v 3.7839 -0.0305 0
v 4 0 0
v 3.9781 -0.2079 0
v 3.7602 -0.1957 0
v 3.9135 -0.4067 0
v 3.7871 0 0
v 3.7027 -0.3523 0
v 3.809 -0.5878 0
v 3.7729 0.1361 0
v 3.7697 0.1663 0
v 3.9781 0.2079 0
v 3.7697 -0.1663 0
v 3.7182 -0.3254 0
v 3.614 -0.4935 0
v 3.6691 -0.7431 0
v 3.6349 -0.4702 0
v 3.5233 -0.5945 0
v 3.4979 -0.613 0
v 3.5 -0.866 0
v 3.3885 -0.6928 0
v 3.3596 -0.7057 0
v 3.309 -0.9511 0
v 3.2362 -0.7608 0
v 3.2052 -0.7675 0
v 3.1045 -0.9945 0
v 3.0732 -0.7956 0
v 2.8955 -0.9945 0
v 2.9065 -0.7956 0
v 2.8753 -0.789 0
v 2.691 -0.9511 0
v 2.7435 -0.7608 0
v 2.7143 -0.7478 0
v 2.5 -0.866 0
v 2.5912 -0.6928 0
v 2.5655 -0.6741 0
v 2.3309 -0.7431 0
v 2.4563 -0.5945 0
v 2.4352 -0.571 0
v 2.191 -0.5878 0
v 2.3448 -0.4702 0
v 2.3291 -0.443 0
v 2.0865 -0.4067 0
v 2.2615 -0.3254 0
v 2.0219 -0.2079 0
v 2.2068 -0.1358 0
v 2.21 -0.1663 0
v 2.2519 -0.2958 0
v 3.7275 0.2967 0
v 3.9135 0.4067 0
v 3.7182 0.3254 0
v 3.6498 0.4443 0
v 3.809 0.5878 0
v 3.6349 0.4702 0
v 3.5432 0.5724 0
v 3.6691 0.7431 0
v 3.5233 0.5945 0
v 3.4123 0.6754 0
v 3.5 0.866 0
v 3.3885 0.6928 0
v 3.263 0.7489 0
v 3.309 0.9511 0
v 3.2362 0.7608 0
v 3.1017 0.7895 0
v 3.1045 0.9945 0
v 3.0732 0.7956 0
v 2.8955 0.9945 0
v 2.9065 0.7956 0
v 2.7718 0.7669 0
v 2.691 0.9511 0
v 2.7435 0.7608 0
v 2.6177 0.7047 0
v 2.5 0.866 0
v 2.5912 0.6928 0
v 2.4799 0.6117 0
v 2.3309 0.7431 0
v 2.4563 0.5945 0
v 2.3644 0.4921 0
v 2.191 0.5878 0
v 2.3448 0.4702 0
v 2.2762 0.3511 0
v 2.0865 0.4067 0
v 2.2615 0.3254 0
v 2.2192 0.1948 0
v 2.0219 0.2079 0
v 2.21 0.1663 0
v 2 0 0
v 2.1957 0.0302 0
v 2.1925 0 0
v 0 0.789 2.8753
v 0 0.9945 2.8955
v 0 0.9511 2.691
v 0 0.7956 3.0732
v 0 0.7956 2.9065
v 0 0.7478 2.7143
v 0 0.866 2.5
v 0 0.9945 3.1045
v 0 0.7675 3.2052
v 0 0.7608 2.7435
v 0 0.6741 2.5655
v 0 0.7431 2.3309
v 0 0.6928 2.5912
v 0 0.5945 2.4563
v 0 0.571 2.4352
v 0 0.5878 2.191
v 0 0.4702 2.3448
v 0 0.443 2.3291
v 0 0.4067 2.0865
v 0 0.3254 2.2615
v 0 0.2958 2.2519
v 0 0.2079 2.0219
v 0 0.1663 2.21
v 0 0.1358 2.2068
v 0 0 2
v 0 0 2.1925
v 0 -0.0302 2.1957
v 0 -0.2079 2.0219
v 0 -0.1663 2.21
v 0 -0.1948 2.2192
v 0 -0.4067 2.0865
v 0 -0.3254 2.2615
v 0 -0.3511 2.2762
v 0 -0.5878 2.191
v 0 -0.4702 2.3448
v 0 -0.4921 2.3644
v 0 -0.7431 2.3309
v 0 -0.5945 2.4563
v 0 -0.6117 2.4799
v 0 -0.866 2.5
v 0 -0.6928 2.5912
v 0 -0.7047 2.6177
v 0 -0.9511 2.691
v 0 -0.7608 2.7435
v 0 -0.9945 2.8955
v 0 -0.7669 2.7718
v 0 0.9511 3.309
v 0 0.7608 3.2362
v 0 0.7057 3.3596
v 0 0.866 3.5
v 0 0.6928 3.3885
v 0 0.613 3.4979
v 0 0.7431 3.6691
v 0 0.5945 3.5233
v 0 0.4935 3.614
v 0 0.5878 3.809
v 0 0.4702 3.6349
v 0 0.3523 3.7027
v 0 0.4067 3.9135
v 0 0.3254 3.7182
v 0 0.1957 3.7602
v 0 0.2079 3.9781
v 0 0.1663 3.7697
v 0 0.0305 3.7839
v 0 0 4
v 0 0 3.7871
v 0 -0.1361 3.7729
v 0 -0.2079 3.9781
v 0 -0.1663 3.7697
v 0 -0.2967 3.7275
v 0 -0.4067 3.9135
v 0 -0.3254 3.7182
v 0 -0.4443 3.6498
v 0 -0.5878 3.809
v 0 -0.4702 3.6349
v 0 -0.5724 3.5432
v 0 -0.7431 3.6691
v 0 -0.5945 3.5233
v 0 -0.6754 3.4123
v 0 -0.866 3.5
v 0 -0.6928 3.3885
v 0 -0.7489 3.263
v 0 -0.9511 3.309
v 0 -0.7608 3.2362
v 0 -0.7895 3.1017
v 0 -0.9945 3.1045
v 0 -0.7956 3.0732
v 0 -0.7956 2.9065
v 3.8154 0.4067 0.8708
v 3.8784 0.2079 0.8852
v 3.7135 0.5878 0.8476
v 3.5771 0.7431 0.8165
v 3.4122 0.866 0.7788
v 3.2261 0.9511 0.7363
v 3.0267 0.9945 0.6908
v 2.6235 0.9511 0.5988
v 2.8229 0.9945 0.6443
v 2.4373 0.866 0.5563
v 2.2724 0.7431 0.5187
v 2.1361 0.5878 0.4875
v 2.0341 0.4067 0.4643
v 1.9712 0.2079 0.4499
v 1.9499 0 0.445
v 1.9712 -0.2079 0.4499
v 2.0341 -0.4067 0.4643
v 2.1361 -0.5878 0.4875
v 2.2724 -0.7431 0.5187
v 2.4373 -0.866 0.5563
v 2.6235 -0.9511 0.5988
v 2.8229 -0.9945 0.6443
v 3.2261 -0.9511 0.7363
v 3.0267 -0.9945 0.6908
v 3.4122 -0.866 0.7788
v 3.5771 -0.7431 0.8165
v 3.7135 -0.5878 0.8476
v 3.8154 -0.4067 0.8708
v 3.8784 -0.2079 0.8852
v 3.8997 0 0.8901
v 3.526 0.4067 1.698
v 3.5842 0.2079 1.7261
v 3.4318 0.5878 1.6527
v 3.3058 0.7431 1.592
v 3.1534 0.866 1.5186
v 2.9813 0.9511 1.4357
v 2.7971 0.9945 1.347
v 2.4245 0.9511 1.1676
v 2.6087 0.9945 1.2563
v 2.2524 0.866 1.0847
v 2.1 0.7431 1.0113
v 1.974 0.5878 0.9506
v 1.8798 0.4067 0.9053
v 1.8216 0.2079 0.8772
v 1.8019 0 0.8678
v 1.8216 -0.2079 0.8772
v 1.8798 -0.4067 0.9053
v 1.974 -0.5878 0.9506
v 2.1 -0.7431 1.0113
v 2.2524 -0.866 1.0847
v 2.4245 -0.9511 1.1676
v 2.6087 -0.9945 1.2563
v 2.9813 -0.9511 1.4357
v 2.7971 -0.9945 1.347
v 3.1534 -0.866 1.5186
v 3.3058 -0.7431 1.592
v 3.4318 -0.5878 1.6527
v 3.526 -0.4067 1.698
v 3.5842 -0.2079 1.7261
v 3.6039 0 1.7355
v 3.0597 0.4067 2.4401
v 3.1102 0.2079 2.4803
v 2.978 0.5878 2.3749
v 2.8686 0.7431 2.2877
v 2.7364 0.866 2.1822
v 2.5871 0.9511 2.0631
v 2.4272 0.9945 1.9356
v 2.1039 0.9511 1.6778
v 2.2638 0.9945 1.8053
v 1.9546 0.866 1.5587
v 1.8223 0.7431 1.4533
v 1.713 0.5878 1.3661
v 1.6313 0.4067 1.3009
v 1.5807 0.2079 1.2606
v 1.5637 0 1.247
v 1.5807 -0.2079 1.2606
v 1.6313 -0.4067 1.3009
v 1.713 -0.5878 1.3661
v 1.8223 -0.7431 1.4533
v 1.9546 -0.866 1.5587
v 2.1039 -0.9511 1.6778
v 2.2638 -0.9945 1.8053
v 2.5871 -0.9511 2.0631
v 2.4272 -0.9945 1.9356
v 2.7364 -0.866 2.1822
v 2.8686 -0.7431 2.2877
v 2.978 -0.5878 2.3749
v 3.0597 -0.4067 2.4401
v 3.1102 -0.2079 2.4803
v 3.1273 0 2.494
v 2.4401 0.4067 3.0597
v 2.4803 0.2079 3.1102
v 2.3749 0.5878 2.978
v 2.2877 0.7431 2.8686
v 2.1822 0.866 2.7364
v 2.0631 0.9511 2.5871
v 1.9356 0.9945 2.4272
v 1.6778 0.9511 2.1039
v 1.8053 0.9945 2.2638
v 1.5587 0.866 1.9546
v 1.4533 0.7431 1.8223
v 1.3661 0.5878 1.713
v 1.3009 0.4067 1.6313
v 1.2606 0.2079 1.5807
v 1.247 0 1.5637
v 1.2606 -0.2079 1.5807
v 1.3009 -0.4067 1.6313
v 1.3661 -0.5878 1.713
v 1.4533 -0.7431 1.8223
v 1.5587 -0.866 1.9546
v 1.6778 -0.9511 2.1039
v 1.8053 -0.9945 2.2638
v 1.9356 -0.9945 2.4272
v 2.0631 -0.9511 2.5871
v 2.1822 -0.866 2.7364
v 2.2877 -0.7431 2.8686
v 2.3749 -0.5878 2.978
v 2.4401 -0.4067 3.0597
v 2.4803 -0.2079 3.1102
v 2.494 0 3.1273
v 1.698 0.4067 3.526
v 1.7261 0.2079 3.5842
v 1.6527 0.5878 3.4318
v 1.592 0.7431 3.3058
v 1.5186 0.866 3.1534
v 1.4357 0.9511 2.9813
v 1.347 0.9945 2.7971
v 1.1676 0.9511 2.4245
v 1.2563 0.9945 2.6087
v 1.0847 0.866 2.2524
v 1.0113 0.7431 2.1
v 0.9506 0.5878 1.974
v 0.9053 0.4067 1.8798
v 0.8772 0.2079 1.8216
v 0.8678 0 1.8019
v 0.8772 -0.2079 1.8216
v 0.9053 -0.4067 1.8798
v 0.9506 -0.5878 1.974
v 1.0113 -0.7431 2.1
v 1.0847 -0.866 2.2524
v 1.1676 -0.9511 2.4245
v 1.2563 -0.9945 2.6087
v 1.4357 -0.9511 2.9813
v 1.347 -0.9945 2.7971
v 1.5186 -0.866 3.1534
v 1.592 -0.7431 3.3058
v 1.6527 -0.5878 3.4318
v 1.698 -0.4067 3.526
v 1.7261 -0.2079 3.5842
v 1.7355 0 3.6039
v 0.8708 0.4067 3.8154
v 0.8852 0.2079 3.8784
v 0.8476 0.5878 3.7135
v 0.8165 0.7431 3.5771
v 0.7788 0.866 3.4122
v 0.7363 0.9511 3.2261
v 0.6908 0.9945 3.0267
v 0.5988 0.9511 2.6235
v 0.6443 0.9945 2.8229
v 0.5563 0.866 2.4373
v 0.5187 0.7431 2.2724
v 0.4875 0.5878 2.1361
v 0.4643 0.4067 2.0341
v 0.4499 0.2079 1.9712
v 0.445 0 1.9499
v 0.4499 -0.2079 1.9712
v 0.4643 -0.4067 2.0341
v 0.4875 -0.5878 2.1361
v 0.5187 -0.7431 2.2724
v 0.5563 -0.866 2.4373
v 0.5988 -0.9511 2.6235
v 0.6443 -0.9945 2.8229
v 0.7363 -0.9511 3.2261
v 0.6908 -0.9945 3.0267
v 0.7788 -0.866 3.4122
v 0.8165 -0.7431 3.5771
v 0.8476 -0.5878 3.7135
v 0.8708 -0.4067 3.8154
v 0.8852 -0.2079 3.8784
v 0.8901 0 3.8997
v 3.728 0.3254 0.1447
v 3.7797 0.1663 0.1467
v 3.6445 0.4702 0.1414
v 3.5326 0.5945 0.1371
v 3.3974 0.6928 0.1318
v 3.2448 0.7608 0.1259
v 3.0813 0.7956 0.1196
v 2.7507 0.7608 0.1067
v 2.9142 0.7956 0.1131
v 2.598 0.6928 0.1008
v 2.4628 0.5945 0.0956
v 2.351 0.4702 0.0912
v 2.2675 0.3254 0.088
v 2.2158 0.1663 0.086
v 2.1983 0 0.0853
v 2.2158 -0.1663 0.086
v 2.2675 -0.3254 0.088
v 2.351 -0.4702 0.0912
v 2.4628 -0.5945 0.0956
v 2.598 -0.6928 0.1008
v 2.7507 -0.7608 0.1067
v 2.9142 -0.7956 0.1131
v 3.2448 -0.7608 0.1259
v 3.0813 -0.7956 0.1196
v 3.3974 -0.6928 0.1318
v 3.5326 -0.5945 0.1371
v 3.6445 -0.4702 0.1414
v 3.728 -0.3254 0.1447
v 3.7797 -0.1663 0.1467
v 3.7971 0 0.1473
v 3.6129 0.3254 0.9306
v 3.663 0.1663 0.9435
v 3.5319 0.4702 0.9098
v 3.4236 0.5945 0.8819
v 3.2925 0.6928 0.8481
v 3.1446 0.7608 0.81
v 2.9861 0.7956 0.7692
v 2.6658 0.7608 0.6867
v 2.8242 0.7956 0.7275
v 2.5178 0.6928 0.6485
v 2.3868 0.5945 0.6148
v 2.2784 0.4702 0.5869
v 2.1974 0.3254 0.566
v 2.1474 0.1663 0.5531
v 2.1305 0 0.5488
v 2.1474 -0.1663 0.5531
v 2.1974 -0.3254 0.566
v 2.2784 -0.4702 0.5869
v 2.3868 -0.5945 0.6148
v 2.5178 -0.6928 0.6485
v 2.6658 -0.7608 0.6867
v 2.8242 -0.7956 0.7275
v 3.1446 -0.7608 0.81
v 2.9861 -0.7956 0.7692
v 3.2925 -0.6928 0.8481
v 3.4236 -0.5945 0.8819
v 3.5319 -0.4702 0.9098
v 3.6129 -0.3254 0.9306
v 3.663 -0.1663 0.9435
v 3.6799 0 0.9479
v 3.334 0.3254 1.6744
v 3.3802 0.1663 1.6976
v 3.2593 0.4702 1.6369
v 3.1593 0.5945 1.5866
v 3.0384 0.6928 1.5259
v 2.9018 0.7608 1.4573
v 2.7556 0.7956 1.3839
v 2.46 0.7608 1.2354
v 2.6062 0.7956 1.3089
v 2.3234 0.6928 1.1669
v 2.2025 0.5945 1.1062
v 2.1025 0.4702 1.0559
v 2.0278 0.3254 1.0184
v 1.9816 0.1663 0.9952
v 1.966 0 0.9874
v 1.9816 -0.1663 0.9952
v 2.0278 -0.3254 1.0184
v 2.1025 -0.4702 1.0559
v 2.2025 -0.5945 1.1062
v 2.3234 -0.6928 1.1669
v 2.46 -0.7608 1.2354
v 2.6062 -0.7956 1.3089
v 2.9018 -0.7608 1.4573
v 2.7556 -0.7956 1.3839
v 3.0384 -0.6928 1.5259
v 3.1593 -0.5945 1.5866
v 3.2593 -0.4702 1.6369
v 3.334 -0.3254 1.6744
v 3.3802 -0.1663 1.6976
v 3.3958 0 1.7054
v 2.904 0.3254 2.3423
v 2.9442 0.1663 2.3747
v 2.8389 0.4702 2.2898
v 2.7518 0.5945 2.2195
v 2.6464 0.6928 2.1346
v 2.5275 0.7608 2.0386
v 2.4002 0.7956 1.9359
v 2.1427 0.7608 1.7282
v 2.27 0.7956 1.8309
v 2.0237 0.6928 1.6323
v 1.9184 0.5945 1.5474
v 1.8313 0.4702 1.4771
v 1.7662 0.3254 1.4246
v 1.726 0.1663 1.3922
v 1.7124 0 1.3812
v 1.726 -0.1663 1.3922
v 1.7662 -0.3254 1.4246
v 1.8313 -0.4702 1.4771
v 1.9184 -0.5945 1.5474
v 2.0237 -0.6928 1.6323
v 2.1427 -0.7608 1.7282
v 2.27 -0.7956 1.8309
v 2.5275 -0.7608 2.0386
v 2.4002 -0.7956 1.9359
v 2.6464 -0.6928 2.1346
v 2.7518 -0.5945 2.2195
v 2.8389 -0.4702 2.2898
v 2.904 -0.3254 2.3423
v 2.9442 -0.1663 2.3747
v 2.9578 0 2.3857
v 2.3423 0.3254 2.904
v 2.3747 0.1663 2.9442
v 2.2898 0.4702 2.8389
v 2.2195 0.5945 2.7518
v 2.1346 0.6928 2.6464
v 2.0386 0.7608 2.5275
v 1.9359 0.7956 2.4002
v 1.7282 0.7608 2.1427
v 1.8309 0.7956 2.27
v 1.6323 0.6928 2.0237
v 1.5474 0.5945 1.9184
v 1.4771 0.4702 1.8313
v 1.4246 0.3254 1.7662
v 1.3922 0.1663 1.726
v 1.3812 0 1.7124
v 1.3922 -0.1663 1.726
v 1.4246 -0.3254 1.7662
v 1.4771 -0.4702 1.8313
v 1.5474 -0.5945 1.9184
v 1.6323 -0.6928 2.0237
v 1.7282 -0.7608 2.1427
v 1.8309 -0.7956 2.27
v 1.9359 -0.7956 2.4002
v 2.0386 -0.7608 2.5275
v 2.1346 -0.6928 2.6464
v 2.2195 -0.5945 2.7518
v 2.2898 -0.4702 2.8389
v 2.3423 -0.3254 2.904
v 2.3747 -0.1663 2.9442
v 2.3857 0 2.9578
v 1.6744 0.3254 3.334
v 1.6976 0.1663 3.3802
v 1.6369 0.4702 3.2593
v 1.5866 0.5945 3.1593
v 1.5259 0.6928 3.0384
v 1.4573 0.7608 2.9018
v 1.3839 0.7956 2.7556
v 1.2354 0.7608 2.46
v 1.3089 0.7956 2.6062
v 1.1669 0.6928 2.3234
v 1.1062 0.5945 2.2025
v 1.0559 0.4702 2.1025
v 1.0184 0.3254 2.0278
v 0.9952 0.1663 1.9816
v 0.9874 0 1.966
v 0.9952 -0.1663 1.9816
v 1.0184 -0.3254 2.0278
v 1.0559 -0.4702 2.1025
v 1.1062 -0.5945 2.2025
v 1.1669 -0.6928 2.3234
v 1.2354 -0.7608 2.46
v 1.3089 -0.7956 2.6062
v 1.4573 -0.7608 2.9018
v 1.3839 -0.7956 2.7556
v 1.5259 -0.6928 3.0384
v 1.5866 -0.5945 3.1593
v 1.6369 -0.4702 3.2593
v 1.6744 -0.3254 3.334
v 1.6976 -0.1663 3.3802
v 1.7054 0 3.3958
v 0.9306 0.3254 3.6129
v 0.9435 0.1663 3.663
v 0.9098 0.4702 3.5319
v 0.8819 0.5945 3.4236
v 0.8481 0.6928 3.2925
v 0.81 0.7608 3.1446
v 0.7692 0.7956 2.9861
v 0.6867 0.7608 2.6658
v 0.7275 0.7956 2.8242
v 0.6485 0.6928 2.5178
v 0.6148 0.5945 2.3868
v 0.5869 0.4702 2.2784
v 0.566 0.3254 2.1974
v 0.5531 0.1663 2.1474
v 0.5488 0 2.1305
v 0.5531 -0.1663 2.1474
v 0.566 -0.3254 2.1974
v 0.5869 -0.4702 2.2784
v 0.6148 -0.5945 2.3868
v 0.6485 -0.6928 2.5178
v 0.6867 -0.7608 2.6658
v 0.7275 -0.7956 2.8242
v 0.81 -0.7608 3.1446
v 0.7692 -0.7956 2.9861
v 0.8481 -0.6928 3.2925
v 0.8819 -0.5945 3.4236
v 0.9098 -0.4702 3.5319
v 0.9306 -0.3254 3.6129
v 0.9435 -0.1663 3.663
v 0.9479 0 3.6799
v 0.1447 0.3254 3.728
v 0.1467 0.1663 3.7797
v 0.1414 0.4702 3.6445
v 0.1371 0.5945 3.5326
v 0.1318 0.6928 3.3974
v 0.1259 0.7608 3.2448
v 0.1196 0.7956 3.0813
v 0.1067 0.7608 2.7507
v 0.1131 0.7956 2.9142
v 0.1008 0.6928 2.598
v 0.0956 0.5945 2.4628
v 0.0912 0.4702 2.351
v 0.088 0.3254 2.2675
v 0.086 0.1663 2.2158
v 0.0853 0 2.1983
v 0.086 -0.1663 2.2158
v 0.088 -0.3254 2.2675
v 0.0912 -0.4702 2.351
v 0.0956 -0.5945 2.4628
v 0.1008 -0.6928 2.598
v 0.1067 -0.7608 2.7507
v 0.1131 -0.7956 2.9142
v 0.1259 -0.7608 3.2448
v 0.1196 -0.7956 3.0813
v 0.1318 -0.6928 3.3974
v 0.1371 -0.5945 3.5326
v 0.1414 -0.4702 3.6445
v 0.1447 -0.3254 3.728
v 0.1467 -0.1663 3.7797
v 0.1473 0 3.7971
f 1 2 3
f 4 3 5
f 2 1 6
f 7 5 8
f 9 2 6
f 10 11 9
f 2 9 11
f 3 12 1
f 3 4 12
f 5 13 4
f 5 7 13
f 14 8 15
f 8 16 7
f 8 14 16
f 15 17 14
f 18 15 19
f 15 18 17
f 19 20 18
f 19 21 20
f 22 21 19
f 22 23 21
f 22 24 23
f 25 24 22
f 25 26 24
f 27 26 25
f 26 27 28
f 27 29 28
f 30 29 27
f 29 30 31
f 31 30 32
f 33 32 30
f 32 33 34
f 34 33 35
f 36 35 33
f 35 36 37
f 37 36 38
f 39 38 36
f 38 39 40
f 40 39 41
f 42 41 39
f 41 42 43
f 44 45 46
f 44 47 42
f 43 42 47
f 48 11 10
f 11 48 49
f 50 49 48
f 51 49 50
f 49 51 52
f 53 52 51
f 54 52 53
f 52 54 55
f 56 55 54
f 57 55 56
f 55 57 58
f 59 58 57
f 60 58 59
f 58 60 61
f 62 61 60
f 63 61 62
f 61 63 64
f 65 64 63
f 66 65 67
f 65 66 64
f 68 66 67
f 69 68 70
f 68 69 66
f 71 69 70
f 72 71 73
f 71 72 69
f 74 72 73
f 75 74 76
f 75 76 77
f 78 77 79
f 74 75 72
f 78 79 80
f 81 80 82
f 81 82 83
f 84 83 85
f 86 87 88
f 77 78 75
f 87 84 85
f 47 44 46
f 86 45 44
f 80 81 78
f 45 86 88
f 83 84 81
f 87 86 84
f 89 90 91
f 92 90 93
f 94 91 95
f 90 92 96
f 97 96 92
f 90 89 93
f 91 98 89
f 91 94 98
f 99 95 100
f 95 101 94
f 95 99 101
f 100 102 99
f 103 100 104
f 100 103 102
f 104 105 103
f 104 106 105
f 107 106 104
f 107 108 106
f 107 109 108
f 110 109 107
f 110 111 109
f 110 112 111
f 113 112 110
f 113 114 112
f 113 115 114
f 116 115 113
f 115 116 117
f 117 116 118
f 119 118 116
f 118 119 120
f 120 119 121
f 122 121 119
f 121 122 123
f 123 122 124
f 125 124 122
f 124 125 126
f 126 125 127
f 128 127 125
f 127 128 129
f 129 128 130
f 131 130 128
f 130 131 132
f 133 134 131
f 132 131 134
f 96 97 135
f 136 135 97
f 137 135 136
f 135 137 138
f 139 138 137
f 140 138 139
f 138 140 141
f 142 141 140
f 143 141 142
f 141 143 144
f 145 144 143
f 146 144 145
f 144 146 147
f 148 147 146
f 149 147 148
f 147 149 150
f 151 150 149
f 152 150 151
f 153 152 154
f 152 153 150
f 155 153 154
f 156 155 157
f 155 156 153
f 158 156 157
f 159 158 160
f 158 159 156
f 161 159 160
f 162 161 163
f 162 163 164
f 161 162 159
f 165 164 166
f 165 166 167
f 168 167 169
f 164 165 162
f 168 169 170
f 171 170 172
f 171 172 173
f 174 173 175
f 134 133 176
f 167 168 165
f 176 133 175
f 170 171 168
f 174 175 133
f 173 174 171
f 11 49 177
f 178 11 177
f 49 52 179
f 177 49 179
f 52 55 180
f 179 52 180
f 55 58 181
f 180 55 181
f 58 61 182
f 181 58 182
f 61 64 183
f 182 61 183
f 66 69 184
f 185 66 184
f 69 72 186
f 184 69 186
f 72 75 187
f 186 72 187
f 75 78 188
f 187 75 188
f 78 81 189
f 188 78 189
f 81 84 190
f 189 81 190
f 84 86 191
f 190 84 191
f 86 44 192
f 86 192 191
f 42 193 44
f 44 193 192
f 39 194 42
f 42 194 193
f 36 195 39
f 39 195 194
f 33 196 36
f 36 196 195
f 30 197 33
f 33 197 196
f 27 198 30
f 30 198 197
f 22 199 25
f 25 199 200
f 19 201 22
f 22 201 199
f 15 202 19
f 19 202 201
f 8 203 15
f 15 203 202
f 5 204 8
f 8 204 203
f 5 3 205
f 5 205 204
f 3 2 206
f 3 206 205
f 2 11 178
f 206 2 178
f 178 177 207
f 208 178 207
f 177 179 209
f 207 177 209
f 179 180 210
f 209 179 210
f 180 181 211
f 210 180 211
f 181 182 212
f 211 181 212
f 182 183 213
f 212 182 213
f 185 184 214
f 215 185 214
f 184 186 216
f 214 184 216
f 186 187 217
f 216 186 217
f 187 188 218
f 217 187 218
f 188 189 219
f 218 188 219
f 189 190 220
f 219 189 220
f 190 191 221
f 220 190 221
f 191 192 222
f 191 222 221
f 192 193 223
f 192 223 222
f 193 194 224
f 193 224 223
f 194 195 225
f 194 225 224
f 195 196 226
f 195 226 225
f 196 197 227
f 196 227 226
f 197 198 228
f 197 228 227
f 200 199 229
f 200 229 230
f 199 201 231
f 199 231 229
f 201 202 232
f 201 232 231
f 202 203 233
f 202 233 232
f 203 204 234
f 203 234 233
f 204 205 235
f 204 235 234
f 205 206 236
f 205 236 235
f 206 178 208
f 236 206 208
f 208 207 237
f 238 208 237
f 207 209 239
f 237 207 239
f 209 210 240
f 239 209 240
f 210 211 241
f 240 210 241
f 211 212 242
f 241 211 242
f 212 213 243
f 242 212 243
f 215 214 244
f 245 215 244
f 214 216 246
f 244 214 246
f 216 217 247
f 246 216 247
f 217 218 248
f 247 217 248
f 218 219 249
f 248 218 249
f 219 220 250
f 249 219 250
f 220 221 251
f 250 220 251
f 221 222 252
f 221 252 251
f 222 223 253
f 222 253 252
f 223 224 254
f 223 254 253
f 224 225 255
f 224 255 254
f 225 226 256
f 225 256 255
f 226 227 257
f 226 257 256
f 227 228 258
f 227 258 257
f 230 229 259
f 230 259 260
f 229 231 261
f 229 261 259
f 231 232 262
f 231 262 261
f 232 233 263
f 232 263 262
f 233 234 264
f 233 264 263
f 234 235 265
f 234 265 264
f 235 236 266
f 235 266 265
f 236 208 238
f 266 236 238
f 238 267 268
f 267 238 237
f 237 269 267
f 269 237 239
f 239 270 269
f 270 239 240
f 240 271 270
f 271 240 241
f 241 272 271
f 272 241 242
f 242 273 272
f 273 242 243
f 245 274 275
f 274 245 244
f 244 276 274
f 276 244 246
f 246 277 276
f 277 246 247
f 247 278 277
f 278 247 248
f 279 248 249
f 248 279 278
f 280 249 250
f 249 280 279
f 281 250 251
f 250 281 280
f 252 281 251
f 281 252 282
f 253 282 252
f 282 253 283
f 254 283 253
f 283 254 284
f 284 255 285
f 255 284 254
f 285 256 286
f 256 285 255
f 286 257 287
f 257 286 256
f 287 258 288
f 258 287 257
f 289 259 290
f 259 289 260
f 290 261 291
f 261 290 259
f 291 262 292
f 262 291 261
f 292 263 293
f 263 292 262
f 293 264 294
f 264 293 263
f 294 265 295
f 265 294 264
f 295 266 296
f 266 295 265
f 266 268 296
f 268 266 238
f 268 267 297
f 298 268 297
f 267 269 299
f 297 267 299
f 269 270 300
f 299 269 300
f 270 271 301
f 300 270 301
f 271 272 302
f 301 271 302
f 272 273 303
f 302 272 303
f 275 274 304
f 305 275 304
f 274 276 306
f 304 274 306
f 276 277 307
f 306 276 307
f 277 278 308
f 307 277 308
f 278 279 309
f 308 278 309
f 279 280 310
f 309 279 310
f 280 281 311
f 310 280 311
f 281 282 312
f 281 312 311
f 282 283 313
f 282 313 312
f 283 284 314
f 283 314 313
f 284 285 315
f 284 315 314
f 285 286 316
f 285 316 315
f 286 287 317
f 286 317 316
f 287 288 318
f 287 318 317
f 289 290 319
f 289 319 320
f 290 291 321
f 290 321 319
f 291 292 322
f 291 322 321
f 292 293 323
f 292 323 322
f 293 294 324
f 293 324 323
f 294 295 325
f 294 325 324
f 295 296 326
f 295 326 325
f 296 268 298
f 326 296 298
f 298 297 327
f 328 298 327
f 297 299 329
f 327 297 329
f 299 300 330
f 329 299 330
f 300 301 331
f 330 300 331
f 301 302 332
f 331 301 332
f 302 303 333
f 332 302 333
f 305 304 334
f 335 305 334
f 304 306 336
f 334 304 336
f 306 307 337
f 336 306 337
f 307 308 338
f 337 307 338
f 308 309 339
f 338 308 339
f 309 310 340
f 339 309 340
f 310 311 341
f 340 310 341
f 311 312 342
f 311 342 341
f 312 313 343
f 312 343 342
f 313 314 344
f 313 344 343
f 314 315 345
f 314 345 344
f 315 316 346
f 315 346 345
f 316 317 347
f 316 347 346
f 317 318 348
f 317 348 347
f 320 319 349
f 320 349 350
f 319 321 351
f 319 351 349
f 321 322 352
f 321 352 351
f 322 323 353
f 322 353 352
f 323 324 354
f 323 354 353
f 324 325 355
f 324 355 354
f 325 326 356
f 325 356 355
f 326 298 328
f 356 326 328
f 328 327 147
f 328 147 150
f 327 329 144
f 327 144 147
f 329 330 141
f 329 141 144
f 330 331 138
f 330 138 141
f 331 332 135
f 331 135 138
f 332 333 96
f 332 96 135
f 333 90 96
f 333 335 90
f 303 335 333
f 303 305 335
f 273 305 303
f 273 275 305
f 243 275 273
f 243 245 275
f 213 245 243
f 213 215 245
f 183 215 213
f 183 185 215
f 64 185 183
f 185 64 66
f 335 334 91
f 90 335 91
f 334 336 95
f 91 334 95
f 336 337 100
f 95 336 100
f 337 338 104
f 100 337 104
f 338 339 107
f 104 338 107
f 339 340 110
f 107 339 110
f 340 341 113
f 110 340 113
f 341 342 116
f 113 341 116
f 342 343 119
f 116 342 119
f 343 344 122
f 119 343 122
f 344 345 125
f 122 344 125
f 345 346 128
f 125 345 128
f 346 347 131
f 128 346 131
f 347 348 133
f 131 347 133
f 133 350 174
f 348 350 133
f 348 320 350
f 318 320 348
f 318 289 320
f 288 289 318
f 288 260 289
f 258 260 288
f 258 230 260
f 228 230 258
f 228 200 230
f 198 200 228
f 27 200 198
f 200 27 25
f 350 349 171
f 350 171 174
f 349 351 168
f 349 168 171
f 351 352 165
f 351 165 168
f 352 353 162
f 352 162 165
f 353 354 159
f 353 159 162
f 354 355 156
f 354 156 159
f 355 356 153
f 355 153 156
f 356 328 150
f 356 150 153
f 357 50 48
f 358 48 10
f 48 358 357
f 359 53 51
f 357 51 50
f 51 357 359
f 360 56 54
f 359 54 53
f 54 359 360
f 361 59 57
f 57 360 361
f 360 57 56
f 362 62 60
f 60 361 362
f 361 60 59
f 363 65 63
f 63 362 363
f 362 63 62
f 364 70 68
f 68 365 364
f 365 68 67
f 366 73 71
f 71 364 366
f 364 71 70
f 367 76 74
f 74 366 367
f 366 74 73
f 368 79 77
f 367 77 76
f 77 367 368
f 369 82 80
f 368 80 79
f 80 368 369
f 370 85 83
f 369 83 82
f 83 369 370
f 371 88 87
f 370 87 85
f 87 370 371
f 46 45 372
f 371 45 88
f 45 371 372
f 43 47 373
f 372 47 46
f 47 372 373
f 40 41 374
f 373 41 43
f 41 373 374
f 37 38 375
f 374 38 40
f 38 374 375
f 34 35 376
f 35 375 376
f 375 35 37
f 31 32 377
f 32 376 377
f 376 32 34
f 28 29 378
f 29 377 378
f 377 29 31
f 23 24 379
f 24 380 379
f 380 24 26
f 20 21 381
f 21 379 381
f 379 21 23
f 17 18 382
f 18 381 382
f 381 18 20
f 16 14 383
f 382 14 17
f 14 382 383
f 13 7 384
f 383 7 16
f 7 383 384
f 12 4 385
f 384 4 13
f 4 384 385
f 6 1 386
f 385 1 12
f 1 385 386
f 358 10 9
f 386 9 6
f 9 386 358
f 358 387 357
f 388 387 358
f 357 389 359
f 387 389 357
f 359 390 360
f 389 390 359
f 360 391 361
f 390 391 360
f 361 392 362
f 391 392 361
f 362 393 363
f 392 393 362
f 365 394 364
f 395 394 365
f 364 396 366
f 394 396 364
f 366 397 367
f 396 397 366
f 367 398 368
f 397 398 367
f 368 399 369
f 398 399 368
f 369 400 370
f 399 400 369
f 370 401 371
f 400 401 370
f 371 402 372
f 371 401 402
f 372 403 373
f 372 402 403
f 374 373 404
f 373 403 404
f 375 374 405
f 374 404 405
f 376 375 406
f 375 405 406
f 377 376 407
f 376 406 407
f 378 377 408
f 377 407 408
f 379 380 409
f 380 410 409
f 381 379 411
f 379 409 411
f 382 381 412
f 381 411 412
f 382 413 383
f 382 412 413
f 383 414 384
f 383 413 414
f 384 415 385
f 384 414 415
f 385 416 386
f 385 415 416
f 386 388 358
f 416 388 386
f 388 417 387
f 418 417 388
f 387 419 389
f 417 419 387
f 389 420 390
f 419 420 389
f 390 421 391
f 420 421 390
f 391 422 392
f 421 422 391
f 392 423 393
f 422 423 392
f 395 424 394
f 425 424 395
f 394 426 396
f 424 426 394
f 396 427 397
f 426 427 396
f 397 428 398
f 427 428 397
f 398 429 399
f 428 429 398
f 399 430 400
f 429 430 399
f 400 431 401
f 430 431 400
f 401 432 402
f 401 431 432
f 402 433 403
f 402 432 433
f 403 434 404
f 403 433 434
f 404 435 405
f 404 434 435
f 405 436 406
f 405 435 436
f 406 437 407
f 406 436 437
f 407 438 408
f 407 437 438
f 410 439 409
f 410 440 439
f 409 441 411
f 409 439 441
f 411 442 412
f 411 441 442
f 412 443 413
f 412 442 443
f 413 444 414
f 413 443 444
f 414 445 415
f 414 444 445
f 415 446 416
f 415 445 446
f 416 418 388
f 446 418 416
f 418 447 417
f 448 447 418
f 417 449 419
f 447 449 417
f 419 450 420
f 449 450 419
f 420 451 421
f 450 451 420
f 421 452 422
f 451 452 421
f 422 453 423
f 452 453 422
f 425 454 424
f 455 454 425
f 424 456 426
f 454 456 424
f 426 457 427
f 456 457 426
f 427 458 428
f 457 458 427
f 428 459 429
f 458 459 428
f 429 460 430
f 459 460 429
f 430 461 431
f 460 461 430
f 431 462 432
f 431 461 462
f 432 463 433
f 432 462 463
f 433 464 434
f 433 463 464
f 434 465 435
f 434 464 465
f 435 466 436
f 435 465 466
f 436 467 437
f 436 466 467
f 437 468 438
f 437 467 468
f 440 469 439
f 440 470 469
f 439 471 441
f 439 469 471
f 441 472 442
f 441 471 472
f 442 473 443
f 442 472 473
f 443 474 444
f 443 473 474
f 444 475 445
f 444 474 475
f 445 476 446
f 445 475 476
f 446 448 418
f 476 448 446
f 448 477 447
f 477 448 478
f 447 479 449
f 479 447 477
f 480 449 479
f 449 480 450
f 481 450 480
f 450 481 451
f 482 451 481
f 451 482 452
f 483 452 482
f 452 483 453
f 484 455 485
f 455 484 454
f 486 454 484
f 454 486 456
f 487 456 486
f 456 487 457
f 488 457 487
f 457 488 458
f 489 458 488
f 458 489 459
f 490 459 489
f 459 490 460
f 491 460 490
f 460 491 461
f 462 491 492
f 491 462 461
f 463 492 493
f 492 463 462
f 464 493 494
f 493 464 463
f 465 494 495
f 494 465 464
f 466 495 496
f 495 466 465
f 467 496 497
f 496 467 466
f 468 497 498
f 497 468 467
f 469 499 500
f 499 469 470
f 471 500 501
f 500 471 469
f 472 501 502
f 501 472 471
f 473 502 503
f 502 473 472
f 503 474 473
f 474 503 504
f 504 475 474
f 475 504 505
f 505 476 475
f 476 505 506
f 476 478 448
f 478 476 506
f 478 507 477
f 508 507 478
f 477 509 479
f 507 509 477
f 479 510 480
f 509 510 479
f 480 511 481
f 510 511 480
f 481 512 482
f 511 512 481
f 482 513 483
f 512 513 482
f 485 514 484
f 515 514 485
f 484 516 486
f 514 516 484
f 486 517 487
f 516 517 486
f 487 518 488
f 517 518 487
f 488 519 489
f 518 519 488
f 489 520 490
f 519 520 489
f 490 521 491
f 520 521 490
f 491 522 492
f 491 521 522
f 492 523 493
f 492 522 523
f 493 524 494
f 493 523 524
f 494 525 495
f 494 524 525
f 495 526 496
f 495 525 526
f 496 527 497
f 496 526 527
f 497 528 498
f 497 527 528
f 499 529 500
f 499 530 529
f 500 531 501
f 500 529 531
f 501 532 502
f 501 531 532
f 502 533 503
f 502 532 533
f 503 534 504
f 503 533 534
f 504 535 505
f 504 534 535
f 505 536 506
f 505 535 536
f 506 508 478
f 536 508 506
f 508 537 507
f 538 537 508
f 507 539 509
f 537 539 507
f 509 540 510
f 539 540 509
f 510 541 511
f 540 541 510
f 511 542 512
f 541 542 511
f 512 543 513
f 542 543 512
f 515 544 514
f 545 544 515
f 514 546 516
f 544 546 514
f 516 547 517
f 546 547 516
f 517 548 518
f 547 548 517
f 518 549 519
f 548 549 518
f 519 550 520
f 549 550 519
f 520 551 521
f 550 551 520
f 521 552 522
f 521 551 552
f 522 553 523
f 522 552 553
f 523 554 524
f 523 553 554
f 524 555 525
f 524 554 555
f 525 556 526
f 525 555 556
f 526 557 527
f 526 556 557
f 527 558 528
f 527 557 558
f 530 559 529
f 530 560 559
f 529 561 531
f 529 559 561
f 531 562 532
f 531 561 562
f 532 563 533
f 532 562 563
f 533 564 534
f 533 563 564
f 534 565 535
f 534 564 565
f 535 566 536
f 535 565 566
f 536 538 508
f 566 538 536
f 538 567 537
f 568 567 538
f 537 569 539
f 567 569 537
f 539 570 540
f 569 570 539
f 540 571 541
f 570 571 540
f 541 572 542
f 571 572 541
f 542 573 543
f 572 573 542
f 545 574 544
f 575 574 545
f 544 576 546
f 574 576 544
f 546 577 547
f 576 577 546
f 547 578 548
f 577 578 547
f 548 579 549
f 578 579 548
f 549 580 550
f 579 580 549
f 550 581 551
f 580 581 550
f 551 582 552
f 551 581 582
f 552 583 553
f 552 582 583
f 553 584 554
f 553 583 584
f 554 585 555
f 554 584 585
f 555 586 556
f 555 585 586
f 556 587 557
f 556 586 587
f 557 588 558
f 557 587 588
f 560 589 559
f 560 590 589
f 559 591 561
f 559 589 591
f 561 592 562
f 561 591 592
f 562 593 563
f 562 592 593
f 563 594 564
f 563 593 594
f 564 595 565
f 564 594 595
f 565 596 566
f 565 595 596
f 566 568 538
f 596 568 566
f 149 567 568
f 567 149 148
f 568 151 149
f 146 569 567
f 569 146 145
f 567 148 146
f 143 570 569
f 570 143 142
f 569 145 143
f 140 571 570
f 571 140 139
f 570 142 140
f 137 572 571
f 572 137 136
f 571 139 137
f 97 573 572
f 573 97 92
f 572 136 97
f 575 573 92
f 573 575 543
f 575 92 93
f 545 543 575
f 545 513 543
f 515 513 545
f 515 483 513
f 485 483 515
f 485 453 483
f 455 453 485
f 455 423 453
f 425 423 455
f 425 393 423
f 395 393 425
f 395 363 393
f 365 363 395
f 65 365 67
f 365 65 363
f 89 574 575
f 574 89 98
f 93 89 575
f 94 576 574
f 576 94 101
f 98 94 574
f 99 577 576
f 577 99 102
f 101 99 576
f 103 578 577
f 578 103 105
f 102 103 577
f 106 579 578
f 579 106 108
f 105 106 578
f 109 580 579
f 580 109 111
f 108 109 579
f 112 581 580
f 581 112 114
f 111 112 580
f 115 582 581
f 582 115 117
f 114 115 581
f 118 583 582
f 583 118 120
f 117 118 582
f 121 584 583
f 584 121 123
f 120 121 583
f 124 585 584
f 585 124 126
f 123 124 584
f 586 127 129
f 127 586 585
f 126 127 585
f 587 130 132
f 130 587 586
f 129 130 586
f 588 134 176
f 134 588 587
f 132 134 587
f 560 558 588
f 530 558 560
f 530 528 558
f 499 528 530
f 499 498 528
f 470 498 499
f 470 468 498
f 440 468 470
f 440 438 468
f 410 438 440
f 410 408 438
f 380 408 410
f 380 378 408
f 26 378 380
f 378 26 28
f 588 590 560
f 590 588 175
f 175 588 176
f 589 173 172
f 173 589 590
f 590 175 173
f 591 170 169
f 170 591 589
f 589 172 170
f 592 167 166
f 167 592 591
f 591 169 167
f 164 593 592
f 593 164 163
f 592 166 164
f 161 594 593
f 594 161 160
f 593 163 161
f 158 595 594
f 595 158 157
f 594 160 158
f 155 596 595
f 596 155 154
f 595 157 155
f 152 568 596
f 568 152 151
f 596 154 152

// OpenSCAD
module Pipe_90(){

    module pipe(raggio,angolo){
        color("#a8b0b2")
        rotate([90,0,0])
        rotate_extrude(angle=angolo, $fn = $preview? 90: 30) 
        translate([3, 0, 0])
        circle(r = raggio, $fn = $preview? 90: 30);
    }

    difference(){
       translate([0,0])
       pipe(1,90);
       
       rotate([0,10,0])
       translate([0,0])
       pipe(0.8,110);
     }

    module repeat(){
        difference(){
         for (i =[-1:1]){
             translate([0,5*i,0])
             ring(1,90);
         }
         
         for (i =[-1:1]){
            rotate([0,10,0])
             translate([0,5*i,0])
             ring(0.8,110);
             }
         
        }
    }

}

Pipe_90();

// Written by Nicolì Angelo (Gengio) 2024: 
// MIT License

//Permission is hereby granted, free of charge, to any person obtaining a copy of this software and associated documentation files (the "Software"), to deal in the Software without restriction, including without limitation the rights to use, copy, modify, merge, publish, distribute, sublicense, and/or sell copies of the Software, and to permit persons to whom the Software is furnished to do so, subject to the following conditions:

//The above copyright notice and this permission notice shall be included in all copies or substantial portions of the Software.

//THE SOFTWARE IS PROVIDED "AS IS", WITHOUT WARRANTY OF ANY KIND, EXPRESS OR IMPLIED, INCLUDING BUT NOT LIMITED TO THE WARRANTIES OF MERCHANTABILITY, FITNESS FOR A PARTICULAR PURPOSE AND NONINFRINGEMENT. IN NO EVENT SHALL THE AUTHORS OR COPYRIGHT HOLDERS BE LIABLE FOR ANY CLAIM, DAMAGES OR OTHER LIABILITY, WHETHER IN AN ACTION OF CONTRACT, TORT OR OTHERWISE, ARISING FROM, OUT OF OR IN CONNECTION WITH THE SOFTWARE OR THE USE OR OTHER DEALINGS IN THE SOFTWARE.
